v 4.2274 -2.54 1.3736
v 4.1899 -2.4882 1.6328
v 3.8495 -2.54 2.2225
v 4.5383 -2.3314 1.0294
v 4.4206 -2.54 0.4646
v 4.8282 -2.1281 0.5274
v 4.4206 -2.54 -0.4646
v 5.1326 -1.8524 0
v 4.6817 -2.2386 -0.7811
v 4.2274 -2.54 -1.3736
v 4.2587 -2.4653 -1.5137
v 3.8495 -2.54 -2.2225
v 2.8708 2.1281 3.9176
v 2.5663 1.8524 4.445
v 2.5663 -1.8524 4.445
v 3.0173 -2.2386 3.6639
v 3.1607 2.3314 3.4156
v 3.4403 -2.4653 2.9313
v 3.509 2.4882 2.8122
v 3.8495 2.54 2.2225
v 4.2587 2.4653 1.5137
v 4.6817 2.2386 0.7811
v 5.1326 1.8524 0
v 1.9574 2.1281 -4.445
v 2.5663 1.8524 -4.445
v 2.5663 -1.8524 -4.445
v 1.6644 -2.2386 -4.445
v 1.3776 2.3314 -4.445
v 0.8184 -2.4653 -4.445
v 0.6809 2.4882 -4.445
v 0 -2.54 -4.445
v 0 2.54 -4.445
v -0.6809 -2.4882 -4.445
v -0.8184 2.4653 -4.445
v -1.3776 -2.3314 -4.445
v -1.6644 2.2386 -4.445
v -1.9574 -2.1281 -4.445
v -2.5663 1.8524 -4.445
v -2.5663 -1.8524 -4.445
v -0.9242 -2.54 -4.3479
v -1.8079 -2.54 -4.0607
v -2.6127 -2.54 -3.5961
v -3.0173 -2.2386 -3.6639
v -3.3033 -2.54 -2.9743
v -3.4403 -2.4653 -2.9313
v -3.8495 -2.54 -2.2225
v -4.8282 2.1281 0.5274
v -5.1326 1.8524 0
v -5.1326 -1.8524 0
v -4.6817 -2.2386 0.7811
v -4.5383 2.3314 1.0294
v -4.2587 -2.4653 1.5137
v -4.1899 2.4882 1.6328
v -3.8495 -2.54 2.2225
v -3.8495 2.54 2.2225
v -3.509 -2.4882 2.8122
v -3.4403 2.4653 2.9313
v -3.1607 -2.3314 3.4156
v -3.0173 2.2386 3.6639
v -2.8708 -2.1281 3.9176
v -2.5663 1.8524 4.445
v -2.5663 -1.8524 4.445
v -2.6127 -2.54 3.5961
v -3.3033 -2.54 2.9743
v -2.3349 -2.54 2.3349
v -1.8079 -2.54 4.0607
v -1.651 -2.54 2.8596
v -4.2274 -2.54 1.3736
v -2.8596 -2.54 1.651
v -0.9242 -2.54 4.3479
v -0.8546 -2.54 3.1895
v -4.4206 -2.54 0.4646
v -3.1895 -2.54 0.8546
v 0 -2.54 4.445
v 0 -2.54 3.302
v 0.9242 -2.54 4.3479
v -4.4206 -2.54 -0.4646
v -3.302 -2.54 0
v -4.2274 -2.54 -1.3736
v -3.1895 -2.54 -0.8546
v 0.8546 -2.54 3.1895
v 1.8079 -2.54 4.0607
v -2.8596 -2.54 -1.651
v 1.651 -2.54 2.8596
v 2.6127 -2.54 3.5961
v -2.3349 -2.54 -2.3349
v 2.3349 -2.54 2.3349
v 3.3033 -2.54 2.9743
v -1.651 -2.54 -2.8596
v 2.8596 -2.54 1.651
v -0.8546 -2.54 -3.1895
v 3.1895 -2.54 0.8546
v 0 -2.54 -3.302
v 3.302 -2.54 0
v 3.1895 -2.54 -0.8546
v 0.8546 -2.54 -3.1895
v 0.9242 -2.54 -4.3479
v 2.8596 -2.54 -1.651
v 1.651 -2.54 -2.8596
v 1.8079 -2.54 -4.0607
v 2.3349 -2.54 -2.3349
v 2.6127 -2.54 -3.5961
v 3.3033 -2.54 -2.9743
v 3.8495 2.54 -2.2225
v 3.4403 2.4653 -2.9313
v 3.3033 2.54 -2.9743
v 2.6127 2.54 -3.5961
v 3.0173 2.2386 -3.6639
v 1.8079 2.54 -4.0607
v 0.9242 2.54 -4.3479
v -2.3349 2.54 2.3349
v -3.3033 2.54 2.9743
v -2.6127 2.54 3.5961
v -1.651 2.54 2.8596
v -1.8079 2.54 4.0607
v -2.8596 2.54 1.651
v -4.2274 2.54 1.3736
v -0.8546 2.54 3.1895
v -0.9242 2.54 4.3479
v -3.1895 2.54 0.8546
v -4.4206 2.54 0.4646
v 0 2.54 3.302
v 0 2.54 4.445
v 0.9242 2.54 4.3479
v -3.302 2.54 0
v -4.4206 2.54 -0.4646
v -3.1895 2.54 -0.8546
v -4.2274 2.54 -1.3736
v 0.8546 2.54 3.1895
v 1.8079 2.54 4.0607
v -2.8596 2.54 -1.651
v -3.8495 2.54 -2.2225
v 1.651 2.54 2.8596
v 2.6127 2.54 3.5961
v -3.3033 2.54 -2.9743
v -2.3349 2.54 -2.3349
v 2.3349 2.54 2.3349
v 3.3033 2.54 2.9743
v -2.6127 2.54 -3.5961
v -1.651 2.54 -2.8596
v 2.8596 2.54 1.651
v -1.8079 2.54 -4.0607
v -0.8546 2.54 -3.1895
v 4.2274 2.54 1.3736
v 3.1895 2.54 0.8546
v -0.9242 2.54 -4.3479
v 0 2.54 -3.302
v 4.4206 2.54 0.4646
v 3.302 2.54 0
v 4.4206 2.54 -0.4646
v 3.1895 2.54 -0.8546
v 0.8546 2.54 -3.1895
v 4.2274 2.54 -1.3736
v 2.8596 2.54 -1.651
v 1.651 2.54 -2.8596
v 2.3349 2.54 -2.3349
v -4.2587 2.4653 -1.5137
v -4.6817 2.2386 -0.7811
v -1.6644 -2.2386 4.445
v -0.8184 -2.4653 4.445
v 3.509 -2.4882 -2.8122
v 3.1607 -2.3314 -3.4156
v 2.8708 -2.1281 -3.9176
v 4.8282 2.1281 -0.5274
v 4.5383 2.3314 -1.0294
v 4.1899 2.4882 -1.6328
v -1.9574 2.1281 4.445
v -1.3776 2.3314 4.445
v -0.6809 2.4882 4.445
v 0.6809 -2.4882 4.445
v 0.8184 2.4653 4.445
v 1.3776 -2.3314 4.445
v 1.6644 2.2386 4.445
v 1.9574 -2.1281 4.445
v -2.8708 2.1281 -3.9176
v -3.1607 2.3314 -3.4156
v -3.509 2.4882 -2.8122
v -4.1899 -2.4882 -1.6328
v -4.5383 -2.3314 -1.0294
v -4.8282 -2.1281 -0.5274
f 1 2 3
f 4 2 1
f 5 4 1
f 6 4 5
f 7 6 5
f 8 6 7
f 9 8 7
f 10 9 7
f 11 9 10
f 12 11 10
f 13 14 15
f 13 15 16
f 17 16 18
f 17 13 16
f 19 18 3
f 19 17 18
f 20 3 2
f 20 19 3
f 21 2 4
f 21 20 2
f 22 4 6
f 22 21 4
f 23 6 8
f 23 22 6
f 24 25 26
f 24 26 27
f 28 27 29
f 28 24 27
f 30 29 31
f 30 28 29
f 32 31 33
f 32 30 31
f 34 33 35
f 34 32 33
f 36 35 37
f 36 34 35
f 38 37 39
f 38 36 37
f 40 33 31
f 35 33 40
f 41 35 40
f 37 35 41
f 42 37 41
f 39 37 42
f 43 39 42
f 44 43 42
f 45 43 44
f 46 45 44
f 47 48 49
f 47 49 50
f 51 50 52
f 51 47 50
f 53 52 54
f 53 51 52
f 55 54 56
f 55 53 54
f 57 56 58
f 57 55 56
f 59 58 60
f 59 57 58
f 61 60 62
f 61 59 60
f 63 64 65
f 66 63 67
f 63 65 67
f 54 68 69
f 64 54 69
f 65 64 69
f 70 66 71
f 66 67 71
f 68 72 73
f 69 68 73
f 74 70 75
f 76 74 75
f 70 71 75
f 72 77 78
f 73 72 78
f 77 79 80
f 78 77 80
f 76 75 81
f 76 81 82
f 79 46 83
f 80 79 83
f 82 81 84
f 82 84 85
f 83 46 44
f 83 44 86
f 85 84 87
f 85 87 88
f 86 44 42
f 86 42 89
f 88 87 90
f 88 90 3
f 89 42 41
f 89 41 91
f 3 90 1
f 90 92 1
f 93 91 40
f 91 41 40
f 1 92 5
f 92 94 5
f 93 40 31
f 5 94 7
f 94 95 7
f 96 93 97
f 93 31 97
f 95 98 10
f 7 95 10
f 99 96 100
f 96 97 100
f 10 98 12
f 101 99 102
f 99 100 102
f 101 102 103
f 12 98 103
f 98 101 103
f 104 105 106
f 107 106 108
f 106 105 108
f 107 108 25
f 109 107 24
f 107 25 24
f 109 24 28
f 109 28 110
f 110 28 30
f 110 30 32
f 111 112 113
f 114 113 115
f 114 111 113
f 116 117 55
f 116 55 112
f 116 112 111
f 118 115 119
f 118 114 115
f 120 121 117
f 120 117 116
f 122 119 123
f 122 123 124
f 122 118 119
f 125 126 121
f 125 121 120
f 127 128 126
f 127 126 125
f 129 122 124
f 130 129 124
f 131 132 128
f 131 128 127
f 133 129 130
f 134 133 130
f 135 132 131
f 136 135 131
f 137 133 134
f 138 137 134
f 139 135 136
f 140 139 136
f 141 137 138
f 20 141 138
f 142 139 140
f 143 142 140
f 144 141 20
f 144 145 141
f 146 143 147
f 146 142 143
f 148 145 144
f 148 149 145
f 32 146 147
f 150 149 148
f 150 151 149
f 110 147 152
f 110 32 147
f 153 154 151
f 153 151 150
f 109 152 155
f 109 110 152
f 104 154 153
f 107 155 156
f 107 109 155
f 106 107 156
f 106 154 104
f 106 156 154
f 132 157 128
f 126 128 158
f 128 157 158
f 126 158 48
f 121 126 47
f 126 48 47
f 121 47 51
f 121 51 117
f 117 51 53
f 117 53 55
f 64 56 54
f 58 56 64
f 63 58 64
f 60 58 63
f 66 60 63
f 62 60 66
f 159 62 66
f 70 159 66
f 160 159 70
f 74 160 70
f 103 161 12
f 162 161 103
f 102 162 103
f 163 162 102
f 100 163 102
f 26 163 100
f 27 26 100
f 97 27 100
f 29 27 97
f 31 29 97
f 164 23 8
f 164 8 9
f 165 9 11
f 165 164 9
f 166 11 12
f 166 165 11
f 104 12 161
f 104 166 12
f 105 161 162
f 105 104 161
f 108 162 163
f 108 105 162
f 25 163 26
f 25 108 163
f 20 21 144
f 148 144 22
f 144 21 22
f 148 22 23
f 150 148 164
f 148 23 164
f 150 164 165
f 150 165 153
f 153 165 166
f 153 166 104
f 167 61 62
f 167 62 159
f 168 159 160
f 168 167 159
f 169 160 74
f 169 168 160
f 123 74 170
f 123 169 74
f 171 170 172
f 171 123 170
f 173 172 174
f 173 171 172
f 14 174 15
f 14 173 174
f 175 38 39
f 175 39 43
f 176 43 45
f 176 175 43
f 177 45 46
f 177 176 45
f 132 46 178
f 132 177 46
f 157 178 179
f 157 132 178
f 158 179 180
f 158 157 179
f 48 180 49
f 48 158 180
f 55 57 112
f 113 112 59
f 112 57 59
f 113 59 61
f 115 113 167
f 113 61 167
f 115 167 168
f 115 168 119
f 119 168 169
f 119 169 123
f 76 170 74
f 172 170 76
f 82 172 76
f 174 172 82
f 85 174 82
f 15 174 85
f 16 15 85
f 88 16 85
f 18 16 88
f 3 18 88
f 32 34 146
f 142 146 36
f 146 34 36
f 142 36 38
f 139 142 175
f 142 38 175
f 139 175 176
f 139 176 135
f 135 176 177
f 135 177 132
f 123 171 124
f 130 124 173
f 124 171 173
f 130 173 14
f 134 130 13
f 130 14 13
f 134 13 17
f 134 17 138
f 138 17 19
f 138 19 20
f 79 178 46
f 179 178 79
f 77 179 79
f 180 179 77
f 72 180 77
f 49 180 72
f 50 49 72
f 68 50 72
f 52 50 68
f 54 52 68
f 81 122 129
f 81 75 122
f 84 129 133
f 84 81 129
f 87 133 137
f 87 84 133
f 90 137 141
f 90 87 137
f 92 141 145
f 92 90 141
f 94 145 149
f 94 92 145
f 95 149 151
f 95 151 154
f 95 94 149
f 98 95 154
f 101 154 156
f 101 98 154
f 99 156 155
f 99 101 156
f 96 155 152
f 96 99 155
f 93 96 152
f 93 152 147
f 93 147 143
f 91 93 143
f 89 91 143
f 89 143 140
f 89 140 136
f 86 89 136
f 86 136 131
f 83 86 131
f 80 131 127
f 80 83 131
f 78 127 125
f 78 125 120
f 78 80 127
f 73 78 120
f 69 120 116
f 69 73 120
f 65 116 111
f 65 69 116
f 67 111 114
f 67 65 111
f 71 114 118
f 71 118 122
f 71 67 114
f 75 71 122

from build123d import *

# Parameters (mm, degrees)
SKETCH1_R           = 3.302
BOSS_EXTRUDE1_DEPTH = 2.54


# Read off the part's stored shape, not the designer's step: Cut-Extrude1
with BuildPart() as part:
    # Sketch1 → Boss-Extrude1 (new, symmetric)
    with BuildSketch(Plane(origin=(0, 0, 0), x_dir=(1, 0, 0), z_dir=(0, 1, 0))):
        Polygon((5.132643893, 0), (2.566321947, 4.445), (-2.566321947, 4.445), (-5.132643893, 0), (-2.566321947, -4.445), (2.566321947, -4.445), align=None)
        with Locations(Location((0, 0, 0), (0, 0, 270))):
            Circle(SKETCH1_R, mode=Mode.SUBTRACT)
    extrude(amount=BOSS_EXTRUDE1_DEPTH, both=True)

    # Cut-Extrude1 outline → Cut-Extrude1 (revolve, cut)
    with BuildSketch(Plane.XY):
        Polygon((5.132643901, 2.540000192), (4.444999936, 2.540000192), (5.132643898, 1.852356102), align=None)
    cut_extrude1 = revolve(axis=Axis((0, 0, 0), (0, 1, 0)), mode=Mode.SUBTRACT)

    # Mirror1: Cut-Extrude1 across plane
    add(cut_extrude1.mirror(Plane.ZX), mode=Mode.SUBTRACT)


solid = part.part
